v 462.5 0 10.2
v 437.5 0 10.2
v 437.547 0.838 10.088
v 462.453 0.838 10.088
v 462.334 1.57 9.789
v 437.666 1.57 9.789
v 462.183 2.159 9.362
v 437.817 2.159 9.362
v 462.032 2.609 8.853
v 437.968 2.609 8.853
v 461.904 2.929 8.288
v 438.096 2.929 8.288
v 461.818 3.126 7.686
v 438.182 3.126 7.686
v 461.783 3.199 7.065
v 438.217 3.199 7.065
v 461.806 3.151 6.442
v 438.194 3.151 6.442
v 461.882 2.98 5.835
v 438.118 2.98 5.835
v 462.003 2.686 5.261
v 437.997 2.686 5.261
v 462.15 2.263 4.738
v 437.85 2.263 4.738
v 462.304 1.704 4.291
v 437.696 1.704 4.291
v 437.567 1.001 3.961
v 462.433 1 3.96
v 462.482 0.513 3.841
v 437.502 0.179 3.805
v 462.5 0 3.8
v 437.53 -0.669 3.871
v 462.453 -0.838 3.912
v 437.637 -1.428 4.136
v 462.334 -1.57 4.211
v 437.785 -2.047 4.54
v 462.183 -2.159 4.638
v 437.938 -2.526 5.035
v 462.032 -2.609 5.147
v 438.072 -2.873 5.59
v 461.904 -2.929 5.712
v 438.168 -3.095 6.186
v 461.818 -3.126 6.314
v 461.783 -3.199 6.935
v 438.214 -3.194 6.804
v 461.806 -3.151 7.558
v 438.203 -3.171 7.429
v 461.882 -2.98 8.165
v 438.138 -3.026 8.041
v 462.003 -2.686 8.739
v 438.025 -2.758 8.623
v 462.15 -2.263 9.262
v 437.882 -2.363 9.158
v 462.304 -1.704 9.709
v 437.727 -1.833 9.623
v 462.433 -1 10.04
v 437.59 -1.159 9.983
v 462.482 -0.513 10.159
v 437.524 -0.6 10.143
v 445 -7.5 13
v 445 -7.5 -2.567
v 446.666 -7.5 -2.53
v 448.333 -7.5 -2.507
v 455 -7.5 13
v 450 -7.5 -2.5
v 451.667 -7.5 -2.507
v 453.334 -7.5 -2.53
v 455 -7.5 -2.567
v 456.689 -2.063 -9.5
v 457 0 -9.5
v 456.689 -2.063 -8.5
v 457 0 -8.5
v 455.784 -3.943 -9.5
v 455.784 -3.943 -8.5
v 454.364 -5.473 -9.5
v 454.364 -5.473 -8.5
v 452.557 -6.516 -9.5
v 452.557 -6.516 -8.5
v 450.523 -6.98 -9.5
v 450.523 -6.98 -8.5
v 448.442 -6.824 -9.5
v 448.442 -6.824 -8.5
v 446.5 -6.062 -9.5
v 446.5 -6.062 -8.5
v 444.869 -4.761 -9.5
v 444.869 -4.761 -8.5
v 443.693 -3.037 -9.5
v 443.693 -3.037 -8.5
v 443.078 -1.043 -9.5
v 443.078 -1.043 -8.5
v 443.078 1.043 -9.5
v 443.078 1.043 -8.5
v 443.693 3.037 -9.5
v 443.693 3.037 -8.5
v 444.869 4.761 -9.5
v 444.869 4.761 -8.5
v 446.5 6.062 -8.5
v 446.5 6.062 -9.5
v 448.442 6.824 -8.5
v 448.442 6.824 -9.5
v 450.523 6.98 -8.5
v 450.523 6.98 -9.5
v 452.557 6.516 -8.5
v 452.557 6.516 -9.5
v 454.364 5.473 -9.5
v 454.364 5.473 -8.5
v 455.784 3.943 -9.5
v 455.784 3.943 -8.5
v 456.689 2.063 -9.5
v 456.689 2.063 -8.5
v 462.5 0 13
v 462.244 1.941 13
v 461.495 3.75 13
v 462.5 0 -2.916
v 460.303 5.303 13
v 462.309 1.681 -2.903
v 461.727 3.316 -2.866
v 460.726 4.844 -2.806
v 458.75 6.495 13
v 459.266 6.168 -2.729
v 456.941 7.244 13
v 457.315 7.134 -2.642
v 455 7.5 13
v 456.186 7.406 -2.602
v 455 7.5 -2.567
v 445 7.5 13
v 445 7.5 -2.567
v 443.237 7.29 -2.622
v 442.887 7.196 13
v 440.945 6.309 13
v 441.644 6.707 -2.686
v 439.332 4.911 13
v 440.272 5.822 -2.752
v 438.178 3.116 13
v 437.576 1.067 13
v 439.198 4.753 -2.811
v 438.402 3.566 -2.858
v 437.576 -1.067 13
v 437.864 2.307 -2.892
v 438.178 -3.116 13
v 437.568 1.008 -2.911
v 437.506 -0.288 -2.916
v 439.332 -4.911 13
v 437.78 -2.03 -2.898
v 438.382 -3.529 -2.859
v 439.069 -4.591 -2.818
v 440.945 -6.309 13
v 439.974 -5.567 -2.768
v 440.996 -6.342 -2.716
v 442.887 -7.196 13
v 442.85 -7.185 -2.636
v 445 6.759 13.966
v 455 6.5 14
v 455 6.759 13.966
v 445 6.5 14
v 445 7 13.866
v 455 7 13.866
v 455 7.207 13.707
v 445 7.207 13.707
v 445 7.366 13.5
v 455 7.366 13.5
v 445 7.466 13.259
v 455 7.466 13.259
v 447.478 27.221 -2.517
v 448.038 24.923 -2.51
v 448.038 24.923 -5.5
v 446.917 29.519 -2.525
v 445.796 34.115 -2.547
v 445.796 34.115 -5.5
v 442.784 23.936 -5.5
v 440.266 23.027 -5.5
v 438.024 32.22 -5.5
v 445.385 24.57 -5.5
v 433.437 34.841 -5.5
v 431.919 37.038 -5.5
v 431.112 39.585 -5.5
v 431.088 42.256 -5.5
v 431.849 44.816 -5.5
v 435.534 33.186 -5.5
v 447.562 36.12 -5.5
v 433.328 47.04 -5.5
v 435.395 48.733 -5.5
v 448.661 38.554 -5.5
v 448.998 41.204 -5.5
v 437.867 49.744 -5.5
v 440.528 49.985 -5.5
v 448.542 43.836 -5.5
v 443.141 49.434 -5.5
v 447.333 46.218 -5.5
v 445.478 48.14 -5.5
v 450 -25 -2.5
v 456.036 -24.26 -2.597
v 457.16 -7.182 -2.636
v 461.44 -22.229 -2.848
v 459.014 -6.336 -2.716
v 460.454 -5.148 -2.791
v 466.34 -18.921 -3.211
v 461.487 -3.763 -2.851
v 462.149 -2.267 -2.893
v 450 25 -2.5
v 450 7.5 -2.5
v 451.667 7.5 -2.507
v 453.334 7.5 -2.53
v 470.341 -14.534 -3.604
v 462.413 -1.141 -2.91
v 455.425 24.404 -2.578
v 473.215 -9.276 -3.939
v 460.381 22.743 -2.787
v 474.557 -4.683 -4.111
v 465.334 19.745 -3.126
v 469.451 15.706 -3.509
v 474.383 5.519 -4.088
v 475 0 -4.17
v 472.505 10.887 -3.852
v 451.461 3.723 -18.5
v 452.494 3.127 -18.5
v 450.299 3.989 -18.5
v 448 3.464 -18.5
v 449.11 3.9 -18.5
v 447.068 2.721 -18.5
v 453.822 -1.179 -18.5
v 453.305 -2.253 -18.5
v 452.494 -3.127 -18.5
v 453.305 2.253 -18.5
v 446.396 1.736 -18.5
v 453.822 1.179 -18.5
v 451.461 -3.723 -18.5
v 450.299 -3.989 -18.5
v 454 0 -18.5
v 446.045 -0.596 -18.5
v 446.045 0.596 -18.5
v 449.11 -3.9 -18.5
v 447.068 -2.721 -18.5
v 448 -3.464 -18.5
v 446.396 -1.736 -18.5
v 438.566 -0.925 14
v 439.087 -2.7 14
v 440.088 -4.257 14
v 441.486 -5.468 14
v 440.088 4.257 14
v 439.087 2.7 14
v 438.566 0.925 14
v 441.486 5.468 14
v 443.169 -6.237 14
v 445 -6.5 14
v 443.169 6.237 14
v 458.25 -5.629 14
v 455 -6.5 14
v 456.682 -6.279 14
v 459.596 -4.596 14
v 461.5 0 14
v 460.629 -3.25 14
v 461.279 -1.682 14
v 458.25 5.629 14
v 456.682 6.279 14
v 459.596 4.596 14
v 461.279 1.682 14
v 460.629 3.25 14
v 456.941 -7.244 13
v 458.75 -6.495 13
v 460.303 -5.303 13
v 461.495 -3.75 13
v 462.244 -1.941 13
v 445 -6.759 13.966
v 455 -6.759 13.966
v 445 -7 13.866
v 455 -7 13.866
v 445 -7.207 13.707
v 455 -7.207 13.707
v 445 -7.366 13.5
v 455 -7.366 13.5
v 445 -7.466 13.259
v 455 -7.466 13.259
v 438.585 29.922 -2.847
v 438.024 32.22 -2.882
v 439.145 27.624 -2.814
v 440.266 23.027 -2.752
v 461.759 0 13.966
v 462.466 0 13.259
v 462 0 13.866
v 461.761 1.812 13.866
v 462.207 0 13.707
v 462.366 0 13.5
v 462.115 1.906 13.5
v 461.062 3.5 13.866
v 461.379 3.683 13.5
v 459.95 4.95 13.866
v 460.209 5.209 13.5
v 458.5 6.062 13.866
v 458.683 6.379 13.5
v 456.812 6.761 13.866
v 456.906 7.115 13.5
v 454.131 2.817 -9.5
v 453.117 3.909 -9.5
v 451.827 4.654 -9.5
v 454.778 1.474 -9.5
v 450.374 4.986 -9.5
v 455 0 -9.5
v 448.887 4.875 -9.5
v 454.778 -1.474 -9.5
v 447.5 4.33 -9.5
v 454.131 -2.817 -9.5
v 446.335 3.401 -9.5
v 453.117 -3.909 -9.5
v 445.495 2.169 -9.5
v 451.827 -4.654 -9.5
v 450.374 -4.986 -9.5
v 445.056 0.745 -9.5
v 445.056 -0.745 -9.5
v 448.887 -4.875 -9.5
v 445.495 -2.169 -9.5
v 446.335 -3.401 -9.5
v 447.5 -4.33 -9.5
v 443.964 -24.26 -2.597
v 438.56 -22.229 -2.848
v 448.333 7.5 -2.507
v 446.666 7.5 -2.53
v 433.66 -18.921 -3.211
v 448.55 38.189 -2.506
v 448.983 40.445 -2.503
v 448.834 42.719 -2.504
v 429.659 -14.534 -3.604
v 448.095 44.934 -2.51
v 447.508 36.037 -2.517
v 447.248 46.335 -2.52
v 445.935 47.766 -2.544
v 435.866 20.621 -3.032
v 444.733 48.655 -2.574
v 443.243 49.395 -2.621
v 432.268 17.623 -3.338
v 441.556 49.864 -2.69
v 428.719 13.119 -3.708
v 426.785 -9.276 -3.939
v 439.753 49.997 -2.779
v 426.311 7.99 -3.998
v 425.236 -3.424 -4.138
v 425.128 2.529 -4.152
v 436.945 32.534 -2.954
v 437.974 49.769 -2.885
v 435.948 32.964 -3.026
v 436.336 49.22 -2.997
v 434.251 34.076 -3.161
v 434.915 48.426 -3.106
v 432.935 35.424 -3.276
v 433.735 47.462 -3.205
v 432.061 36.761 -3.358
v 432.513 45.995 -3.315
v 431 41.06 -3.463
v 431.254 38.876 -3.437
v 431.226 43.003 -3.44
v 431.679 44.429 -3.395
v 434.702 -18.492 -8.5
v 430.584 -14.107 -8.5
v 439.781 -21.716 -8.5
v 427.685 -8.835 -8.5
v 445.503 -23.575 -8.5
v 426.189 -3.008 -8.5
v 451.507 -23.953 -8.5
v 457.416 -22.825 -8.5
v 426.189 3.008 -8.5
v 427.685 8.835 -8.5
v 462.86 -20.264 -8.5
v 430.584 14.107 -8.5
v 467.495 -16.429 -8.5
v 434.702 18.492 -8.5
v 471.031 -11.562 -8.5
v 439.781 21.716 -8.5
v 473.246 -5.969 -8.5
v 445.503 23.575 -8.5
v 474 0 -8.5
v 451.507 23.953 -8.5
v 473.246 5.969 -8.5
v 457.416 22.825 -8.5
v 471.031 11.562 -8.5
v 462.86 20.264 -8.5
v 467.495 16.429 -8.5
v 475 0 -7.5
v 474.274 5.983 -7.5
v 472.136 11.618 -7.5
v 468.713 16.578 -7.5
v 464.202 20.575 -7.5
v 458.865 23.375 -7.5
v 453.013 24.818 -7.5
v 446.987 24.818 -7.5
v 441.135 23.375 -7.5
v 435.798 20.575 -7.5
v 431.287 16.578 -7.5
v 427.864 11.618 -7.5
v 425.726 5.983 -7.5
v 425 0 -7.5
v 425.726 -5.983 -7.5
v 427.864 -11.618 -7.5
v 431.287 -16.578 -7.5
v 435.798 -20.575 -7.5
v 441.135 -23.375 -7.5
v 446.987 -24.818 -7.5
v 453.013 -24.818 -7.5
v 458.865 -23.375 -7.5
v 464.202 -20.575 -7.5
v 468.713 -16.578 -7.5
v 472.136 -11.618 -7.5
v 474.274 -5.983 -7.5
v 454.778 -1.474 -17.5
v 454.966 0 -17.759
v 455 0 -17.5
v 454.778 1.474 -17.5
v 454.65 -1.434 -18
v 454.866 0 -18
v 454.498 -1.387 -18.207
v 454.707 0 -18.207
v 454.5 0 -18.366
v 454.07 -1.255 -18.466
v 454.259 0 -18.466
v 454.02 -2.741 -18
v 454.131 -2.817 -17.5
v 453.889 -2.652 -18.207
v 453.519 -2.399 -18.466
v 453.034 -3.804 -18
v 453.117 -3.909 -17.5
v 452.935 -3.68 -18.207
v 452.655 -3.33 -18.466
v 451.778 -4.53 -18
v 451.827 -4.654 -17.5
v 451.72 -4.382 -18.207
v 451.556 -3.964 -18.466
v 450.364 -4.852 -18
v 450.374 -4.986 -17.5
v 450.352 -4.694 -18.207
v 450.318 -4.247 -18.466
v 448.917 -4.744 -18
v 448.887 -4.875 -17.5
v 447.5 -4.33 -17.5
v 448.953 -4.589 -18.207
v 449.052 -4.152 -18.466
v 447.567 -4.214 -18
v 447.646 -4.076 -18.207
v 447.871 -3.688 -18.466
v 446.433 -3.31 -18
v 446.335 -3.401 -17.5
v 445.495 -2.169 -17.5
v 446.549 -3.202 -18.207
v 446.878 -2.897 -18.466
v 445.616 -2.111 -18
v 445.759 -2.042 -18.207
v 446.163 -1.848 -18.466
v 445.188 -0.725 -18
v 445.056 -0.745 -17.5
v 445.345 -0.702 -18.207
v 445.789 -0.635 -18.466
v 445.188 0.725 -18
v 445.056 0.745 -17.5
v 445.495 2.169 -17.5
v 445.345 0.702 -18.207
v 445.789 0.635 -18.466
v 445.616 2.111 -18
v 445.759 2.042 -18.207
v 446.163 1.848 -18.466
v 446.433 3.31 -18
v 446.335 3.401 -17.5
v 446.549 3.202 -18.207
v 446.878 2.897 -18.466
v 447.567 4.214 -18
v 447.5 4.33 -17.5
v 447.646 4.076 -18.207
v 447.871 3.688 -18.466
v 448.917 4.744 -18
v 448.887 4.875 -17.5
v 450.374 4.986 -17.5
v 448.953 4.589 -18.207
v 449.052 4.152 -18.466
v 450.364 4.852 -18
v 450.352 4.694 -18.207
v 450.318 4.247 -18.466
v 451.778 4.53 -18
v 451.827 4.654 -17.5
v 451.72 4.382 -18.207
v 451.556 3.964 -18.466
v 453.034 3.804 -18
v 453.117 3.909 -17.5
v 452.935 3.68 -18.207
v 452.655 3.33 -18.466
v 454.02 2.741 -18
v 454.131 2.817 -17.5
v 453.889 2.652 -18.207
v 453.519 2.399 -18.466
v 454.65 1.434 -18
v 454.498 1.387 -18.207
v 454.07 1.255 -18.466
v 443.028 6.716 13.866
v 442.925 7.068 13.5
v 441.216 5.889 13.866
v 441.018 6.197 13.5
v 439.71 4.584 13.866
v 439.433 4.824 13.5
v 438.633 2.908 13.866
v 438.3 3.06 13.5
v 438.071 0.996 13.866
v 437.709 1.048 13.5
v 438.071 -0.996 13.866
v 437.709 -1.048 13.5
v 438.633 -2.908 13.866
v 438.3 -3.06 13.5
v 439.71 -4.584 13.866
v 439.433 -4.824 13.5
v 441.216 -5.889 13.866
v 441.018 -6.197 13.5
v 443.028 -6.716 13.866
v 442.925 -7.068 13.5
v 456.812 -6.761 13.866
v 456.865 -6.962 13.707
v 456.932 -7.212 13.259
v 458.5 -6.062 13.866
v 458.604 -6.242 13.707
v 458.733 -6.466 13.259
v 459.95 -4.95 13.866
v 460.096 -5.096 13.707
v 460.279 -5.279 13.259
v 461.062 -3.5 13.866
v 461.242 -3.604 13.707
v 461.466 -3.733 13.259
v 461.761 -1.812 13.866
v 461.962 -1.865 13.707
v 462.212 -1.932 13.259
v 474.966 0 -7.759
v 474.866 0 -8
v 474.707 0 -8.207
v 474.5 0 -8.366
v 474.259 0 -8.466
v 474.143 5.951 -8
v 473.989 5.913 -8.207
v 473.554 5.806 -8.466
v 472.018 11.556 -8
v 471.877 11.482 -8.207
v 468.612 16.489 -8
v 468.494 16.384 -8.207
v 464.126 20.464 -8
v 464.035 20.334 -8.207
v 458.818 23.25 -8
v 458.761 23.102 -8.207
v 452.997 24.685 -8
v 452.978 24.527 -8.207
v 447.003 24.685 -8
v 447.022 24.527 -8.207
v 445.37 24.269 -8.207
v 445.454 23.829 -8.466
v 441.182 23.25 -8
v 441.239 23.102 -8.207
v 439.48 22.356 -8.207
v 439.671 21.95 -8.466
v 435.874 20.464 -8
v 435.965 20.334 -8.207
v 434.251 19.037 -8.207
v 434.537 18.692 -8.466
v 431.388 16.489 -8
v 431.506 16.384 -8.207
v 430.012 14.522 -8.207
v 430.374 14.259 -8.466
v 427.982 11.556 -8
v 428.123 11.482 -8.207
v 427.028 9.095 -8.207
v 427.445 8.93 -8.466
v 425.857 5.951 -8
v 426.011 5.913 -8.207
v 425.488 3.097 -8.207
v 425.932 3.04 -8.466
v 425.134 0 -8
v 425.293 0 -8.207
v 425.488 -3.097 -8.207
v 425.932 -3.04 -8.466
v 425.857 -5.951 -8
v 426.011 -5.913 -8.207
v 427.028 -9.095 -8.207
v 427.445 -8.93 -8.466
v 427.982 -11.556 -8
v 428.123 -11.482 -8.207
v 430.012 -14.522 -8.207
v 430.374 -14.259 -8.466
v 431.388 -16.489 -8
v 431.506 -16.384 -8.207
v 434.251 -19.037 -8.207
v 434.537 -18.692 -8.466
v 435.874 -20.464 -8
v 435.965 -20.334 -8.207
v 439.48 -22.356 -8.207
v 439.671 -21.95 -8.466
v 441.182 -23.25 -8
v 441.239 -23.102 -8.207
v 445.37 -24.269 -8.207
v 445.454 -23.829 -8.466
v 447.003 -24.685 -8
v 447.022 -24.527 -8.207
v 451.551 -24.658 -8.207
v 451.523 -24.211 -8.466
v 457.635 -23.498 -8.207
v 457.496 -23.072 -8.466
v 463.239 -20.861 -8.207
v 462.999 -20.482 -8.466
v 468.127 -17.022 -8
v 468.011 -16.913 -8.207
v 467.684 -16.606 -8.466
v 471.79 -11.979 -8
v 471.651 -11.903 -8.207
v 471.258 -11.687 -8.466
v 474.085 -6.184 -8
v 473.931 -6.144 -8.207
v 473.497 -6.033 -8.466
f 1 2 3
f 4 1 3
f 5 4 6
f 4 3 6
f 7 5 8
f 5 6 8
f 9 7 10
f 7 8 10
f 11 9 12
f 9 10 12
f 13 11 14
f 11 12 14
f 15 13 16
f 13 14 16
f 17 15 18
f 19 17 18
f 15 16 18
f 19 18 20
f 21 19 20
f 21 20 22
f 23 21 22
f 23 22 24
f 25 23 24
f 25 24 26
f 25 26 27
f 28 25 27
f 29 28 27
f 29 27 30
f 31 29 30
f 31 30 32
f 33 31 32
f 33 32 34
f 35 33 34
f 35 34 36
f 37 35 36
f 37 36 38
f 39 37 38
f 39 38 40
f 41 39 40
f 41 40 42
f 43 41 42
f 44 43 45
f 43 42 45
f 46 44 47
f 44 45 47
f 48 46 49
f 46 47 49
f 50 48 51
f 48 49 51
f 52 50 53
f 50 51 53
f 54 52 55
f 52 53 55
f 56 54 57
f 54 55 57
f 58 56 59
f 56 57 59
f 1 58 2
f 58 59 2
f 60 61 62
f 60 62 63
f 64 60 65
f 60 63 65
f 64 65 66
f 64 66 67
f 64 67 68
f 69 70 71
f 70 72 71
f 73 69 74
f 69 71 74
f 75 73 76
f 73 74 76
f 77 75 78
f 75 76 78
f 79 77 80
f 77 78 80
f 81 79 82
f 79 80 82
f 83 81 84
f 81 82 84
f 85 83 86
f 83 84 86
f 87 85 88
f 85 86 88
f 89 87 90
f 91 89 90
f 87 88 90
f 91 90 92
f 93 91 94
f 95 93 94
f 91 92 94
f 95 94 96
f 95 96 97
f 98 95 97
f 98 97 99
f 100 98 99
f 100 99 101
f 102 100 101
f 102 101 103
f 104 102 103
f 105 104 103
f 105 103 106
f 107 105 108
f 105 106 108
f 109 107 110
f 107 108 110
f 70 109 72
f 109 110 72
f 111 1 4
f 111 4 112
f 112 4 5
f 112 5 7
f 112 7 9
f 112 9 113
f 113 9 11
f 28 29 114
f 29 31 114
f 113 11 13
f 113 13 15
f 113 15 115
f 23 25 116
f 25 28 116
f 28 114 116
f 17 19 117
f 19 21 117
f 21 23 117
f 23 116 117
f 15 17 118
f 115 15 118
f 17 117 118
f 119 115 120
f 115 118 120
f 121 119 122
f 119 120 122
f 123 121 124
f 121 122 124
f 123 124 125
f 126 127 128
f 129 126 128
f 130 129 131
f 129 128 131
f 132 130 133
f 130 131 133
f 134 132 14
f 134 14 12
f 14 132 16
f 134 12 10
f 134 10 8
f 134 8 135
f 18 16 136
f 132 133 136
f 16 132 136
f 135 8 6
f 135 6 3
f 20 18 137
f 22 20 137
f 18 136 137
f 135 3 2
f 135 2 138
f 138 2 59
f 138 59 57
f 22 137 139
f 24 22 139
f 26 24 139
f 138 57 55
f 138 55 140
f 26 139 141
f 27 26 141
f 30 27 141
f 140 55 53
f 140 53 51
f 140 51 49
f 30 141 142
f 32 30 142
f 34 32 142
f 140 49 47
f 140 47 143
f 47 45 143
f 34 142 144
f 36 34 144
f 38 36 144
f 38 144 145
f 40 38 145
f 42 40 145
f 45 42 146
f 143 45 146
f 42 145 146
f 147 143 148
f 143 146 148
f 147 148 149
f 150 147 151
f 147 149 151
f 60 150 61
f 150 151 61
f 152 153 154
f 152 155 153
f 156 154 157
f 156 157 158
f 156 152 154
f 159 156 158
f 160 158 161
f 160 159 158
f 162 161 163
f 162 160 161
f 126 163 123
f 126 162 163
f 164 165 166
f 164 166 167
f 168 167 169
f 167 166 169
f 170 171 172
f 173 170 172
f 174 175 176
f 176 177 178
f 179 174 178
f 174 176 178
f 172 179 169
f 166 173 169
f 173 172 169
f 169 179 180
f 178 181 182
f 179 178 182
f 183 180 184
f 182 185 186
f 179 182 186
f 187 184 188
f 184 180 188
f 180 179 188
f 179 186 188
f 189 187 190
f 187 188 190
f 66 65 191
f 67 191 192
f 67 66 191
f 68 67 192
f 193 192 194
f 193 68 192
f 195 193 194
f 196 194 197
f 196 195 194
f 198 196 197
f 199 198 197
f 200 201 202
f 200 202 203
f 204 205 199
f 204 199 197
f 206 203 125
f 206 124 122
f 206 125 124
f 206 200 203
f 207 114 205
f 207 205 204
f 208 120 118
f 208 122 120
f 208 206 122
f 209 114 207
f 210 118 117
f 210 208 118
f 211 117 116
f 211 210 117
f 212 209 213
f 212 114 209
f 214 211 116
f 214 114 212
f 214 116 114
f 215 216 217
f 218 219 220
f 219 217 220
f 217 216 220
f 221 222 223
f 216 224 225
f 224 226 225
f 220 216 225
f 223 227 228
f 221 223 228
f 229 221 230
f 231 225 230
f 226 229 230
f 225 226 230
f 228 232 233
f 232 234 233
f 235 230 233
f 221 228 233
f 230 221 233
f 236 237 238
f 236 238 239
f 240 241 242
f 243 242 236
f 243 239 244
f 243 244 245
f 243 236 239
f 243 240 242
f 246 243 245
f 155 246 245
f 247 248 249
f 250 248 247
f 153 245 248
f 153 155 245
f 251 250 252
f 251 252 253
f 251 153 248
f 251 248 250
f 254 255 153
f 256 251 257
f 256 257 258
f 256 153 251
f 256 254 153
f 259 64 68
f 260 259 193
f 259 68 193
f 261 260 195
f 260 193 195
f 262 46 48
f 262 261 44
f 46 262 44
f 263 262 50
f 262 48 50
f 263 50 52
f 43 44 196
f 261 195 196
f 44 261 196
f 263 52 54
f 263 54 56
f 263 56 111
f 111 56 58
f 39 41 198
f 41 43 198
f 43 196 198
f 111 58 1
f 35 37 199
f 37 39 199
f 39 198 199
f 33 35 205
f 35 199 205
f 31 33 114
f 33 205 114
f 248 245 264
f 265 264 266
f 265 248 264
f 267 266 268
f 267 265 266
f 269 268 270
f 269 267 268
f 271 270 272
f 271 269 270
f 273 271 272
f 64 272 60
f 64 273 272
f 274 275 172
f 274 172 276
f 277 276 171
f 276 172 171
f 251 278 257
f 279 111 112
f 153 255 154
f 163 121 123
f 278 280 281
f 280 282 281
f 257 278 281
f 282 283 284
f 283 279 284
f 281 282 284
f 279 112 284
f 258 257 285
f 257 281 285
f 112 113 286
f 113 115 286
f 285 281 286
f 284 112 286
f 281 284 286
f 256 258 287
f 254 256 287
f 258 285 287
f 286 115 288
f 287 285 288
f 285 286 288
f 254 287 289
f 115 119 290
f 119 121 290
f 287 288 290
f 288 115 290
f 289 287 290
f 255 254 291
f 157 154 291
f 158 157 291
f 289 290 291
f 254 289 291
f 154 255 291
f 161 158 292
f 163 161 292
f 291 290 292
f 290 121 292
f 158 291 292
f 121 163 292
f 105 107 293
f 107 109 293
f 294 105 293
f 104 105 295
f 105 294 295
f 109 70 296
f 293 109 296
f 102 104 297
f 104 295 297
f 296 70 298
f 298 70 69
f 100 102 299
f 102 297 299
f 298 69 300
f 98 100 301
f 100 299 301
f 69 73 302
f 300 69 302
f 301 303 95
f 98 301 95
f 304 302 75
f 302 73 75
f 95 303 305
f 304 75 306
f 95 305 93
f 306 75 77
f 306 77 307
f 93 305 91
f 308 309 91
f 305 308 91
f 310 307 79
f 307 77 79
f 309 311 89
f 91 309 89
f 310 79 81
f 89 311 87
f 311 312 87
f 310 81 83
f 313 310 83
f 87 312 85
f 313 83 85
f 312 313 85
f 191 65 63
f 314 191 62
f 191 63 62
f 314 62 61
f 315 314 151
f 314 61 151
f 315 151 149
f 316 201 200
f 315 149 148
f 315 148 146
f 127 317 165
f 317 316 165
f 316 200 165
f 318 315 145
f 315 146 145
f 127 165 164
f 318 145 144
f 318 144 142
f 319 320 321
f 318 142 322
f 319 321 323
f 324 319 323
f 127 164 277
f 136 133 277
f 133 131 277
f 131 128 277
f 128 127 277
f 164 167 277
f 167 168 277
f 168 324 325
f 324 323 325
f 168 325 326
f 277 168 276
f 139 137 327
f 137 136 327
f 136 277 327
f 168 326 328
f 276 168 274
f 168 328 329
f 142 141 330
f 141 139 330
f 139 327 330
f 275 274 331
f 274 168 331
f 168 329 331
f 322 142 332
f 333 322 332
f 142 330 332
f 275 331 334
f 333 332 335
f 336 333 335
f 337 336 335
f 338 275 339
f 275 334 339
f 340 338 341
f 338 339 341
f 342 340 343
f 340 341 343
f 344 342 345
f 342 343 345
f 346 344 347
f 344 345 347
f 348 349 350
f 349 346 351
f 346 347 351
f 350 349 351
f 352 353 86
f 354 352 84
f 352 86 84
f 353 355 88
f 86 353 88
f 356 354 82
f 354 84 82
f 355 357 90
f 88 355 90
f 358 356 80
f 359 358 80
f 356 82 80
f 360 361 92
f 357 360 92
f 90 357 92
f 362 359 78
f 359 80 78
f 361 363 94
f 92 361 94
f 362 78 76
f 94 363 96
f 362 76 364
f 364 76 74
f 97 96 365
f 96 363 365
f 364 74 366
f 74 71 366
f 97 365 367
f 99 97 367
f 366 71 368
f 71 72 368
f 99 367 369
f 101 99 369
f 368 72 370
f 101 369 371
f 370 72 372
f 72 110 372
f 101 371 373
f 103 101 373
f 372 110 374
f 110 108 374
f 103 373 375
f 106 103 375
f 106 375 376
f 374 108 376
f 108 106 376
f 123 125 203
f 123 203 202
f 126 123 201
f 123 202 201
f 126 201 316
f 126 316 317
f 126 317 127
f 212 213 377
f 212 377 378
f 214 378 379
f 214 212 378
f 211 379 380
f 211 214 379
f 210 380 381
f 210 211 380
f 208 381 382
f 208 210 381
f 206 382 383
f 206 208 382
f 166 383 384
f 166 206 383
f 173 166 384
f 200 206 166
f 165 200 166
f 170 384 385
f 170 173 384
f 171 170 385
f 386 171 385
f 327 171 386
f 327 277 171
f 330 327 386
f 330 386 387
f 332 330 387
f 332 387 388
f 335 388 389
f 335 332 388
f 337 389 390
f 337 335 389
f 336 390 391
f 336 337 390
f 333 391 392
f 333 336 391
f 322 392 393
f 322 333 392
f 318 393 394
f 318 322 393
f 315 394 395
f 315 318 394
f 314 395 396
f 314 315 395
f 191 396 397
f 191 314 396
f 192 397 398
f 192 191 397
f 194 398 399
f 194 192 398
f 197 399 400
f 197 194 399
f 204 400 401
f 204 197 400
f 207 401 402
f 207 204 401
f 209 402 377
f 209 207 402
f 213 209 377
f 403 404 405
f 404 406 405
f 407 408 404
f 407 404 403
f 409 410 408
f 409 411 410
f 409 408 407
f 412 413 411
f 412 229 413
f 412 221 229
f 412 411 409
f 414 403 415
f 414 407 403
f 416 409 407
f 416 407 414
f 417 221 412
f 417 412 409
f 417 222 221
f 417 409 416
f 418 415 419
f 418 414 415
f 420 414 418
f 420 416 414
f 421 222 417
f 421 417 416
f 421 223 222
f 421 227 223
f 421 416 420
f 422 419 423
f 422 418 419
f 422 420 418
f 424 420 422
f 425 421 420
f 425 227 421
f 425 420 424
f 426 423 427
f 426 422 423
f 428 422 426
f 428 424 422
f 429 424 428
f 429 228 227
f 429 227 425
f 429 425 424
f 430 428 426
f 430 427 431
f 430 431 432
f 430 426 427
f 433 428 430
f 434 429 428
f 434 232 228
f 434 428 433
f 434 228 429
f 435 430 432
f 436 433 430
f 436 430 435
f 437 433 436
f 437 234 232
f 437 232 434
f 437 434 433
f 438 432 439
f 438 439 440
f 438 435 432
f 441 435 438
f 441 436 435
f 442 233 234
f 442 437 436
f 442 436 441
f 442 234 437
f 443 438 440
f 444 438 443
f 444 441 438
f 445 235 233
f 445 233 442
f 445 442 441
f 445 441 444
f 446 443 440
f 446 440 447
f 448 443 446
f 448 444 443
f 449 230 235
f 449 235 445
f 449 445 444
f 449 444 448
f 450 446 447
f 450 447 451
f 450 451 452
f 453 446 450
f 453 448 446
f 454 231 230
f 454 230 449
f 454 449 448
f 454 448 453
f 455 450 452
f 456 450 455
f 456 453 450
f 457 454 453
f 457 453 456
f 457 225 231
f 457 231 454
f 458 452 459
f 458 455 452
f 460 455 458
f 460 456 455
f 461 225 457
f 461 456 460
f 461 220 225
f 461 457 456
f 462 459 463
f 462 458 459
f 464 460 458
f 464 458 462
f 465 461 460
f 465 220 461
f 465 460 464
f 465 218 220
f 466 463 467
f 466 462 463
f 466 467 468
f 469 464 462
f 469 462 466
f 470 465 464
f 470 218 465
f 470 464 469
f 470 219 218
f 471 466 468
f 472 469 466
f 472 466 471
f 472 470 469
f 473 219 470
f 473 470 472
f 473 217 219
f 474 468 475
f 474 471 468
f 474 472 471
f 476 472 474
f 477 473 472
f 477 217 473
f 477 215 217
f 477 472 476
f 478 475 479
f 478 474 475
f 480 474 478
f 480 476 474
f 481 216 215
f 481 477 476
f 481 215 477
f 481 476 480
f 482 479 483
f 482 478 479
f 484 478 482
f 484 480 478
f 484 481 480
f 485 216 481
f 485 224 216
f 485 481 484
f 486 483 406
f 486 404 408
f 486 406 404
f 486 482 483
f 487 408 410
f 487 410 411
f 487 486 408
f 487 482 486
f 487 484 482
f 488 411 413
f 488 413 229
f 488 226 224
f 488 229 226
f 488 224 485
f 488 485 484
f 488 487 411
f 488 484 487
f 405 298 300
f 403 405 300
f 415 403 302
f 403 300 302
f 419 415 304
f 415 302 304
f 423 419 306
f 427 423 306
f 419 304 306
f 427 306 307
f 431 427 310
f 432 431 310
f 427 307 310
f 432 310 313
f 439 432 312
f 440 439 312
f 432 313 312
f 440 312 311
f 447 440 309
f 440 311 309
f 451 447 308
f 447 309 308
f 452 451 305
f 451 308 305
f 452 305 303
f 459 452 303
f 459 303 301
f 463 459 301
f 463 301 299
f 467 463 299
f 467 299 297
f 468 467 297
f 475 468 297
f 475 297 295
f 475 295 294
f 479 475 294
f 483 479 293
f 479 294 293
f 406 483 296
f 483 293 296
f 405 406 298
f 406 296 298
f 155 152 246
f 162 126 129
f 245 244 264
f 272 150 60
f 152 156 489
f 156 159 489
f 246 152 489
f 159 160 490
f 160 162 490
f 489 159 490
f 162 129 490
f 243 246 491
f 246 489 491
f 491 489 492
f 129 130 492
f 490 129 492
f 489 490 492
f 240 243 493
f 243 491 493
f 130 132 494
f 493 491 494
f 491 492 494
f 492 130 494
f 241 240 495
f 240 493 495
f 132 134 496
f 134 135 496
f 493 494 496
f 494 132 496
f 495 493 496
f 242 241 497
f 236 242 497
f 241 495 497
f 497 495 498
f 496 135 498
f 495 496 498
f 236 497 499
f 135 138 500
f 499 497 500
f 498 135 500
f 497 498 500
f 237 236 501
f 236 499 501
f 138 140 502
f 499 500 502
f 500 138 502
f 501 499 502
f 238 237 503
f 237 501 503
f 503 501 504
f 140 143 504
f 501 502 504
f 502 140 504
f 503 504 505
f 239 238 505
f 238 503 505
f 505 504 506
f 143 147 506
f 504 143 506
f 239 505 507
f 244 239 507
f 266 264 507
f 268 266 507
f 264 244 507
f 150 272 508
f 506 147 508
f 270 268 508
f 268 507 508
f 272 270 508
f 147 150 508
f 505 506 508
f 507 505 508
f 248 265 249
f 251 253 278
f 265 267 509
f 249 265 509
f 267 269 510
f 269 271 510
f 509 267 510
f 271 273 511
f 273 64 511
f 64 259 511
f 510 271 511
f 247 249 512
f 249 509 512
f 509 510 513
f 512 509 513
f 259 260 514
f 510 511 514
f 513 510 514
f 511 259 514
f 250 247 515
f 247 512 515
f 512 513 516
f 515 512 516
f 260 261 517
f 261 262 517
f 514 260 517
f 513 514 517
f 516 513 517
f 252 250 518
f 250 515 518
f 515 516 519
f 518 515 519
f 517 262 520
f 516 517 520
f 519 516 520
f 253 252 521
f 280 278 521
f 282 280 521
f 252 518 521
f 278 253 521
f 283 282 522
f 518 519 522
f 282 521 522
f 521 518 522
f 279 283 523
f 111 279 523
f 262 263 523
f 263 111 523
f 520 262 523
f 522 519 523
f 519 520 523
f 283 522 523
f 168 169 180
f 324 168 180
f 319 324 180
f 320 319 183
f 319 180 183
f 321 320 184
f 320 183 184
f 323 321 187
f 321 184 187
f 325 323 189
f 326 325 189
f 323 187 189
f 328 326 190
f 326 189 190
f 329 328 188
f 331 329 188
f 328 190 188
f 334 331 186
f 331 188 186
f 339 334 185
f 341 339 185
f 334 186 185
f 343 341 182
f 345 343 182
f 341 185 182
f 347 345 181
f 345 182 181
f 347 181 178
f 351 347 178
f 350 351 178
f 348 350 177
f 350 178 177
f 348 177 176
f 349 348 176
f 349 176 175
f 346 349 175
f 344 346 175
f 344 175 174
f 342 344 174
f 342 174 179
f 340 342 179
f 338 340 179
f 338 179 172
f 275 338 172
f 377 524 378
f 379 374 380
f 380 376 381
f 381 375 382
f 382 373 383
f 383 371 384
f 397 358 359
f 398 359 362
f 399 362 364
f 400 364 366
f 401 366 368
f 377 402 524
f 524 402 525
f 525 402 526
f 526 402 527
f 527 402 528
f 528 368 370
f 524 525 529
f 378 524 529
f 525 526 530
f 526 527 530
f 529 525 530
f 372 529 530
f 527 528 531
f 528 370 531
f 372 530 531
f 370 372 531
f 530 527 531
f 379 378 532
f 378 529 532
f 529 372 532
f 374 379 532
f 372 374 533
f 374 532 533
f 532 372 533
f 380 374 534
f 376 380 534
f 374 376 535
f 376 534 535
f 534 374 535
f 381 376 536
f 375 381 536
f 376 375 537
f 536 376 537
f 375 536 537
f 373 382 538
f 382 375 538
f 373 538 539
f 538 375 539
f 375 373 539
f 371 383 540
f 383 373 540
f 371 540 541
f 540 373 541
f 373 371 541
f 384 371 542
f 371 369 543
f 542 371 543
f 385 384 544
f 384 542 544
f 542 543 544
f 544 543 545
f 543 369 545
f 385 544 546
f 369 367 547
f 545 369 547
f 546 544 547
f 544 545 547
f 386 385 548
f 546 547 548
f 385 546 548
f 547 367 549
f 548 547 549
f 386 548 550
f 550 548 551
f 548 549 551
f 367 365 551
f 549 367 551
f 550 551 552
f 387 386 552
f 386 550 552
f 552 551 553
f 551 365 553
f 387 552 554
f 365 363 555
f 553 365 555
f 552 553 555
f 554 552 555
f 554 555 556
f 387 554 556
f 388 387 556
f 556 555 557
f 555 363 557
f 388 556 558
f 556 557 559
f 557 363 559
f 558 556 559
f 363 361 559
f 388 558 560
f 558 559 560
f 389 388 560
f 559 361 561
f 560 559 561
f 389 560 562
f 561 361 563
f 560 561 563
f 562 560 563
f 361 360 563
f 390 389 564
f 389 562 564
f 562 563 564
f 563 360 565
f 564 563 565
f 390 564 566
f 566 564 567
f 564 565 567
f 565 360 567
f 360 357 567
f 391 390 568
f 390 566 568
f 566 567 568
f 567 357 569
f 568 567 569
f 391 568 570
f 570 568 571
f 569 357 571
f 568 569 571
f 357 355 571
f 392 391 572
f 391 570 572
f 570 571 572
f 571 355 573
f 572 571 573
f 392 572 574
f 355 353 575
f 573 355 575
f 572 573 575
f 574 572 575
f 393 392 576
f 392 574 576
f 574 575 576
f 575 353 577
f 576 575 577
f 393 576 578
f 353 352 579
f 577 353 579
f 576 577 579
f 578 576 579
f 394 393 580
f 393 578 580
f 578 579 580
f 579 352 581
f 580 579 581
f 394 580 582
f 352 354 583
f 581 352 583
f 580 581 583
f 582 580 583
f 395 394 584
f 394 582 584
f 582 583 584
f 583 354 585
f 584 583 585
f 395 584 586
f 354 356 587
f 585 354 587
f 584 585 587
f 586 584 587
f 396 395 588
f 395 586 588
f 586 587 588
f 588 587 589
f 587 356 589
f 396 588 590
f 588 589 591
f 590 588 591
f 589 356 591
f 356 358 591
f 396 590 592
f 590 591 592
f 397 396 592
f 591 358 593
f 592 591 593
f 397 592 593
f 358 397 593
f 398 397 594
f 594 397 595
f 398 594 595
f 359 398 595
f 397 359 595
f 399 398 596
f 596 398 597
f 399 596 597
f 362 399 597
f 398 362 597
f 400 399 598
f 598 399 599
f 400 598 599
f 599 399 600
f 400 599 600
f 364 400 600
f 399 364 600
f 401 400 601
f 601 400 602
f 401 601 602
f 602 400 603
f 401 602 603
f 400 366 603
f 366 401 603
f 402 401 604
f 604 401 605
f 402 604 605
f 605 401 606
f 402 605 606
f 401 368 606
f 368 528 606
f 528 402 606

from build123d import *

# Parameters (mm, degrees)
AUFSATZ_LINEAR_START             = -2.5
SKIZZE2_R                        = 25
AUFSATZ_LINEAR_AUSTRAGEN1_DEPTH  = 6
AUFSATZ_LINEAR_START_2           = -5.5
AUFSATZ_LINEAR_AUSTRAGEN6_DEPTH  = 3
SCHNITT_LINEAR_AUSTRAGEN2_DEPTH  = 478.699958133
AUFSATZ_LINEAR_START_3           = -2.916019
AUFSATZ_LINEAR_AUSTRAGEN5_DEPTH  = 16.916019
SPIEGELN4_START                  = -2.916018908
SPIEGELN4_DEPTH                  = 16.916018908
F_6_4_6_4_DURCHMESSER_BOHRUNG1_D = 6.4
VERRUNDUNG2_R                    = 1


# Read off the part's stored shape, not the designer's step: Spiegeln4
with BuildPart() as part:
    # Skizze2 → Aufsatz-Linear austragen1 (new body)
    with BuildSketch(Plane.XY.offset(AUFSATZ_LINEAR_START)):
        with Locations((450, 0)):
            Circle(SKIZZE2_R)
    extrude(amount=-AUFSATZ_LINEAR_AUSTRAGEN1_DEPTH)

    # Skizze10 → Aufsatz-Linear austragen6 (add)
    with BuildSketch(Plane.XY.offset(AUFSATZ_LINEAR_START_2)):
        with BuildLine():
            Line((448.038494427, 24.922931126), (445.796483155, 34.115177342))
            ThreePointArc((445.796483155, 34.115177342), (437.867394378, 49.743683049), (438.024320445, 32.2195279))
            Line((438.024320445, 32.2195279), (440.266331717, 23.027281684))
            ThreePointArc((440.266331717, 23.027281684), (444.076095495, 24.28800847), (448.038494427, 24.922931126))
        make_face()
    extrude(amount=AUFSATZ_LINEAR_AUSTRAGEN6_DEPTH)

    # Skizze8 → Schnitt-Linear austragen2 (cut, symmetric)
    with BuildSketch(Plane(origin=(0, 0, 0), x_dir=(1, 0, 0), z_dir=(0, 1, 0))):
        with BuildLine():
            Line((475, 2.5), (450, 2.5))
            ThreePointArc((450, 2.5), (462.527846235, 2.917876468), (475, 4.169648205))
            Line((475, 4.169648205), (475, 2.5))
        make_face()
    schnitt_linear_austragen2 = extrude(amount=SCHNITT_LINEAR_AUSTRAGEN2_DEPTH, both=True, mode=Mode.SUBTRACT)

    # Spiegeln1: Schnitt-Linear austragen2 across plane
    add(schnitt_linear_austragen2.mirror(Plane(origin=(450, 0, 0), x_dir=(0, 0, 1), z_dir=(1, 0, 0))), mode=Mode.SUBTRACT)

    # Skizze3 → Aufsatz-Linear austragen5 (add)
    with BuildSketch(Plane.XY.offset(AUFSATZ_LINEAR_START_3)):
        with BuildLine():
            Line((450, 0), (462.5, 0))
            ThreePointArc((462.5, 0), (460.303300859, 5.303300859), (455, 7.5))
            Line((455, 7.5), (450, 7.5))
            Line((450, 7.5), (450, 0))
        make_face()
    extrude(amount=AUFSATZ_LINEAR_AUSTRAGEN5_DEPTH)

    # Spiegeln4 outline → Spiegeln4 (add)
    with BuildSketch(Plane.XY.offset(SPIEGELN4_START)):
        with BuildLine():
            ThreePointArc((455, -7.5), (460.303300859, -5.303300859), (462.5, 0))
            Line((462.5, 0), (450, 0))
            Line((450, 0), (450, 7.5))
            Line((450, 7.5), (445, 7.5))
            ThreePointArc((445, 7.5), (437.5, 0), (445, -7.5))
            Line((445, -7.5), (455, -7.5))
        make_face()
    extrude(amount=SPIEGELN4_DEPTH)

    # Skizze4 → Rotation1 (revolve)
    with BuildSketch(Plane(origin=(450, 0, 0), x_dir=(0, 0, -1), z_dir=(1, 0, 0)), mode=Mode.PRIVATE) as rotation1_sk:
        Polygon((9.5, 7), (8.5, 7), (8.5, 0), (18.5, 0), (18.5, 4), (18.5, 5), (9.5, 5), align=None)
    revolve(rotation1_sk.sketch.rotate(Axis((450, 0, -8.5), (0, 0, -1)), 90), axis=Axis((450, 0, -8.5), (0, 0, -1)))

    # Ø6.4 (6.4) Durchmesser Bohrung1 (through all)
    with Locations(Plane(origin=(462.5, 0, 0), x_dir=(0, 0, -1), z_dir=(1, 0, 0))):
        with Locations((-7, 0)):
            Hole(F_6_4_6_4_DURCHMESSER_BOHRUNG1_D / 2)

    # Verrundung2
    verrundung2_edges = [part.edges().sort_by_distance(p)[0] for p in [
        (437.5, 0, 14),
        (445, 0, -18.5),
        (425, 0, -8.5),
        (460.303300859, 5.303300859, 14),
        (450, 7.5, 14),
        (450, -7.5, 14),
    ]]
    fillet(verrundung2_edges, radius=VERRUNDUNG2_R)


solid = part.part
